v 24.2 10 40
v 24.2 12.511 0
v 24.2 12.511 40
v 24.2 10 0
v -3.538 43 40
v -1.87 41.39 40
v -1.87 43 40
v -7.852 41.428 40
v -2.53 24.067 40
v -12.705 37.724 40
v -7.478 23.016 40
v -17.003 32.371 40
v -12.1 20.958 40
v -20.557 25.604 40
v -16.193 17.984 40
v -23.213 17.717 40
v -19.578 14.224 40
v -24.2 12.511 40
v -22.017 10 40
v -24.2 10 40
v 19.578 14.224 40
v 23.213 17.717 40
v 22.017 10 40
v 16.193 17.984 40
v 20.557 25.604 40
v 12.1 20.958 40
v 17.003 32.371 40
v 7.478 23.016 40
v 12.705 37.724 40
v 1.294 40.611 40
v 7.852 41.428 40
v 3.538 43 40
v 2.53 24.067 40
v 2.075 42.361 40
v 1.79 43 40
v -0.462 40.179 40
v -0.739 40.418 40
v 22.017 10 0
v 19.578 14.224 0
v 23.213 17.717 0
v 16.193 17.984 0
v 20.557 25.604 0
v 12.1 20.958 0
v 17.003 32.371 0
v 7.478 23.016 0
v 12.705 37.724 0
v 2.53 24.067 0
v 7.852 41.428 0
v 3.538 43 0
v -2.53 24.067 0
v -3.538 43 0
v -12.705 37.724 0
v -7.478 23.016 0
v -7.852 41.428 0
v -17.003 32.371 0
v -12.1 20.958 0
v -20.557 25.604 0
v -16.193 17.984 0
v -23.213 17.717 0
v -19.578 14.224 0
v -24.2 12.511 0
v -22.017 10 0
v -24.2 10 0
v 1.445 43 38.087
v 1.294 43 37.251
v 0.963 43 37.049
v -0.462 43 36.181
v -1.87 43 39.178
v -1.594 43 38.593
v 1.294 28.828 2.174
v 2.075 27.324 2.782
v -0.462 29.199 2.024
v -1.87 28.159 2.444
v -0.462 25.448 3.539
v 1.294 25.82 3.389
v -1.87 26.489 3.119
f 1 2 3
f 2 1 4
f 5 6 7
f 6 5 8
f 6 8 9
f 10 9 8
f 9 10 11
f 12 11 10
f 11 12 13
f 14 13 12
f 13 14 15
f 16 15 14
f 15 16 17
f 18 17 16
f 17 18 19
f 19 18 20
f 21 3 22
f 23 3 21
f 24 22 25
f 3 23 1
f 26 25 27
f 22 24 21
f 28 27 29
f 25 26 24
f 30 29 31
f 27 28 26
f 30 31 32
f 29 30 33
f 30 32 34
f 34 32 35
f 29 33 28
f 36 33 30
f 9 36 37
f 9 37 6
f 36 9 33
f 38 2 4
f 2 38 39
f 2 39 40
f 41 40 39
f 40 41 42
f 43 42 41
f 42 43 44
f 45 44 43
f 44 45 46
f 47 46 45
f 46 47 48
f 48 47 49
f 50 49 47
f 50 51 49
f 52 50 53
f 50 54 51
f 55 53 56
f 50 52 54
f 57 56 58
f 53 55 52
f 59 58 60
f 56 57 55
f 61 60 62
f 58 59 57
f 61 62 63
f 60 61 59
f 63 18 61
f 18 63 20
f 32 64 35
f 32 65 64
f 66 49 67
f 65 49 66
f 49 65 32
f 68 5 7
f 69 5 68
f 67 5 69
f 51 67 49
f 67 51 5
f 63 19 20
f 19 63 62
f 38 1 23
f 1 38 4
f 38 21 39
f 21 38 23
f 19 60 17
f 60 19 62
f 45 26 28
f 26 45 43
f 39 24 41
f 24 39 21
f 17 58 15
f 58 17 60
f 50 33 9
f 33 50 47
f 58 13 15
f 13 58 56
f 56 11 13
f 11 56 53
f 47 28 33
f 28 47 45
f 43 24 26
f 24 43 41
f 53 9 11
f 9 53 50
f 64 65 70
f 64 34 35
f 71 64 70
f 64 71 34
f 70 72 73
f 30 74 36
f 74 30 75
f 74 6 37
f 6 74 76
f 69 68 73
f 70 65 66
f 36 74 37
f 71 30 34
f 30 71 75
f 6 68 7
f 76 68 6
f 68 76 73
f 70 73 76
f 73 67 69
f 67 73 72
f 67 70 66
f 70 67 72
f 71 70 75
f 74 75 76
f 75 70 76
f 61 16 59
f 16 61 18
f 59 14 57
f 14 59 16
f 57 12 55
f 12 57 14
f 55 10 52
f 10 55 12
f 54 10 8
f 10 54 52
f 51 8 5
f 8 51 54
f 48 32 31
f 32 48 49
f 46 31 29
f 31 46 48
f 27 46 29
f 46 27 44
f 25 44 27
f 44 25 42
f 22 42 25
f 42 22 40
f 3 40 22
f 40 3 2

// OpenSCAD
shaft_d = 48.4;
spring_steel_d = 3.15;

module shaft() {
  color("white")
    cylinder(d=shaft_d, h=100, center=true);
}

// Spring steel
//spring_steel();
module spring_steel(d=spring_steel_d) {
  color("grey")
    translate([0,shaft_d/2 + 2, 0])
      rotate([-22,0,0])
        translate([0,0,3])
          cylinder(d=d, h=200);
}

difference(){
  translate([-shaft_d/2, 10, 0])
    cube([shaft_d*3/3, 33, 40]);
  shaft();
  spring_steel(spring_steel_d+1);
  translate([0,0,-1])
  scale([1.05,1.8])
    rotate_extrude()
      translate([shaft_d/2,0])
        square([11,42]);


}
